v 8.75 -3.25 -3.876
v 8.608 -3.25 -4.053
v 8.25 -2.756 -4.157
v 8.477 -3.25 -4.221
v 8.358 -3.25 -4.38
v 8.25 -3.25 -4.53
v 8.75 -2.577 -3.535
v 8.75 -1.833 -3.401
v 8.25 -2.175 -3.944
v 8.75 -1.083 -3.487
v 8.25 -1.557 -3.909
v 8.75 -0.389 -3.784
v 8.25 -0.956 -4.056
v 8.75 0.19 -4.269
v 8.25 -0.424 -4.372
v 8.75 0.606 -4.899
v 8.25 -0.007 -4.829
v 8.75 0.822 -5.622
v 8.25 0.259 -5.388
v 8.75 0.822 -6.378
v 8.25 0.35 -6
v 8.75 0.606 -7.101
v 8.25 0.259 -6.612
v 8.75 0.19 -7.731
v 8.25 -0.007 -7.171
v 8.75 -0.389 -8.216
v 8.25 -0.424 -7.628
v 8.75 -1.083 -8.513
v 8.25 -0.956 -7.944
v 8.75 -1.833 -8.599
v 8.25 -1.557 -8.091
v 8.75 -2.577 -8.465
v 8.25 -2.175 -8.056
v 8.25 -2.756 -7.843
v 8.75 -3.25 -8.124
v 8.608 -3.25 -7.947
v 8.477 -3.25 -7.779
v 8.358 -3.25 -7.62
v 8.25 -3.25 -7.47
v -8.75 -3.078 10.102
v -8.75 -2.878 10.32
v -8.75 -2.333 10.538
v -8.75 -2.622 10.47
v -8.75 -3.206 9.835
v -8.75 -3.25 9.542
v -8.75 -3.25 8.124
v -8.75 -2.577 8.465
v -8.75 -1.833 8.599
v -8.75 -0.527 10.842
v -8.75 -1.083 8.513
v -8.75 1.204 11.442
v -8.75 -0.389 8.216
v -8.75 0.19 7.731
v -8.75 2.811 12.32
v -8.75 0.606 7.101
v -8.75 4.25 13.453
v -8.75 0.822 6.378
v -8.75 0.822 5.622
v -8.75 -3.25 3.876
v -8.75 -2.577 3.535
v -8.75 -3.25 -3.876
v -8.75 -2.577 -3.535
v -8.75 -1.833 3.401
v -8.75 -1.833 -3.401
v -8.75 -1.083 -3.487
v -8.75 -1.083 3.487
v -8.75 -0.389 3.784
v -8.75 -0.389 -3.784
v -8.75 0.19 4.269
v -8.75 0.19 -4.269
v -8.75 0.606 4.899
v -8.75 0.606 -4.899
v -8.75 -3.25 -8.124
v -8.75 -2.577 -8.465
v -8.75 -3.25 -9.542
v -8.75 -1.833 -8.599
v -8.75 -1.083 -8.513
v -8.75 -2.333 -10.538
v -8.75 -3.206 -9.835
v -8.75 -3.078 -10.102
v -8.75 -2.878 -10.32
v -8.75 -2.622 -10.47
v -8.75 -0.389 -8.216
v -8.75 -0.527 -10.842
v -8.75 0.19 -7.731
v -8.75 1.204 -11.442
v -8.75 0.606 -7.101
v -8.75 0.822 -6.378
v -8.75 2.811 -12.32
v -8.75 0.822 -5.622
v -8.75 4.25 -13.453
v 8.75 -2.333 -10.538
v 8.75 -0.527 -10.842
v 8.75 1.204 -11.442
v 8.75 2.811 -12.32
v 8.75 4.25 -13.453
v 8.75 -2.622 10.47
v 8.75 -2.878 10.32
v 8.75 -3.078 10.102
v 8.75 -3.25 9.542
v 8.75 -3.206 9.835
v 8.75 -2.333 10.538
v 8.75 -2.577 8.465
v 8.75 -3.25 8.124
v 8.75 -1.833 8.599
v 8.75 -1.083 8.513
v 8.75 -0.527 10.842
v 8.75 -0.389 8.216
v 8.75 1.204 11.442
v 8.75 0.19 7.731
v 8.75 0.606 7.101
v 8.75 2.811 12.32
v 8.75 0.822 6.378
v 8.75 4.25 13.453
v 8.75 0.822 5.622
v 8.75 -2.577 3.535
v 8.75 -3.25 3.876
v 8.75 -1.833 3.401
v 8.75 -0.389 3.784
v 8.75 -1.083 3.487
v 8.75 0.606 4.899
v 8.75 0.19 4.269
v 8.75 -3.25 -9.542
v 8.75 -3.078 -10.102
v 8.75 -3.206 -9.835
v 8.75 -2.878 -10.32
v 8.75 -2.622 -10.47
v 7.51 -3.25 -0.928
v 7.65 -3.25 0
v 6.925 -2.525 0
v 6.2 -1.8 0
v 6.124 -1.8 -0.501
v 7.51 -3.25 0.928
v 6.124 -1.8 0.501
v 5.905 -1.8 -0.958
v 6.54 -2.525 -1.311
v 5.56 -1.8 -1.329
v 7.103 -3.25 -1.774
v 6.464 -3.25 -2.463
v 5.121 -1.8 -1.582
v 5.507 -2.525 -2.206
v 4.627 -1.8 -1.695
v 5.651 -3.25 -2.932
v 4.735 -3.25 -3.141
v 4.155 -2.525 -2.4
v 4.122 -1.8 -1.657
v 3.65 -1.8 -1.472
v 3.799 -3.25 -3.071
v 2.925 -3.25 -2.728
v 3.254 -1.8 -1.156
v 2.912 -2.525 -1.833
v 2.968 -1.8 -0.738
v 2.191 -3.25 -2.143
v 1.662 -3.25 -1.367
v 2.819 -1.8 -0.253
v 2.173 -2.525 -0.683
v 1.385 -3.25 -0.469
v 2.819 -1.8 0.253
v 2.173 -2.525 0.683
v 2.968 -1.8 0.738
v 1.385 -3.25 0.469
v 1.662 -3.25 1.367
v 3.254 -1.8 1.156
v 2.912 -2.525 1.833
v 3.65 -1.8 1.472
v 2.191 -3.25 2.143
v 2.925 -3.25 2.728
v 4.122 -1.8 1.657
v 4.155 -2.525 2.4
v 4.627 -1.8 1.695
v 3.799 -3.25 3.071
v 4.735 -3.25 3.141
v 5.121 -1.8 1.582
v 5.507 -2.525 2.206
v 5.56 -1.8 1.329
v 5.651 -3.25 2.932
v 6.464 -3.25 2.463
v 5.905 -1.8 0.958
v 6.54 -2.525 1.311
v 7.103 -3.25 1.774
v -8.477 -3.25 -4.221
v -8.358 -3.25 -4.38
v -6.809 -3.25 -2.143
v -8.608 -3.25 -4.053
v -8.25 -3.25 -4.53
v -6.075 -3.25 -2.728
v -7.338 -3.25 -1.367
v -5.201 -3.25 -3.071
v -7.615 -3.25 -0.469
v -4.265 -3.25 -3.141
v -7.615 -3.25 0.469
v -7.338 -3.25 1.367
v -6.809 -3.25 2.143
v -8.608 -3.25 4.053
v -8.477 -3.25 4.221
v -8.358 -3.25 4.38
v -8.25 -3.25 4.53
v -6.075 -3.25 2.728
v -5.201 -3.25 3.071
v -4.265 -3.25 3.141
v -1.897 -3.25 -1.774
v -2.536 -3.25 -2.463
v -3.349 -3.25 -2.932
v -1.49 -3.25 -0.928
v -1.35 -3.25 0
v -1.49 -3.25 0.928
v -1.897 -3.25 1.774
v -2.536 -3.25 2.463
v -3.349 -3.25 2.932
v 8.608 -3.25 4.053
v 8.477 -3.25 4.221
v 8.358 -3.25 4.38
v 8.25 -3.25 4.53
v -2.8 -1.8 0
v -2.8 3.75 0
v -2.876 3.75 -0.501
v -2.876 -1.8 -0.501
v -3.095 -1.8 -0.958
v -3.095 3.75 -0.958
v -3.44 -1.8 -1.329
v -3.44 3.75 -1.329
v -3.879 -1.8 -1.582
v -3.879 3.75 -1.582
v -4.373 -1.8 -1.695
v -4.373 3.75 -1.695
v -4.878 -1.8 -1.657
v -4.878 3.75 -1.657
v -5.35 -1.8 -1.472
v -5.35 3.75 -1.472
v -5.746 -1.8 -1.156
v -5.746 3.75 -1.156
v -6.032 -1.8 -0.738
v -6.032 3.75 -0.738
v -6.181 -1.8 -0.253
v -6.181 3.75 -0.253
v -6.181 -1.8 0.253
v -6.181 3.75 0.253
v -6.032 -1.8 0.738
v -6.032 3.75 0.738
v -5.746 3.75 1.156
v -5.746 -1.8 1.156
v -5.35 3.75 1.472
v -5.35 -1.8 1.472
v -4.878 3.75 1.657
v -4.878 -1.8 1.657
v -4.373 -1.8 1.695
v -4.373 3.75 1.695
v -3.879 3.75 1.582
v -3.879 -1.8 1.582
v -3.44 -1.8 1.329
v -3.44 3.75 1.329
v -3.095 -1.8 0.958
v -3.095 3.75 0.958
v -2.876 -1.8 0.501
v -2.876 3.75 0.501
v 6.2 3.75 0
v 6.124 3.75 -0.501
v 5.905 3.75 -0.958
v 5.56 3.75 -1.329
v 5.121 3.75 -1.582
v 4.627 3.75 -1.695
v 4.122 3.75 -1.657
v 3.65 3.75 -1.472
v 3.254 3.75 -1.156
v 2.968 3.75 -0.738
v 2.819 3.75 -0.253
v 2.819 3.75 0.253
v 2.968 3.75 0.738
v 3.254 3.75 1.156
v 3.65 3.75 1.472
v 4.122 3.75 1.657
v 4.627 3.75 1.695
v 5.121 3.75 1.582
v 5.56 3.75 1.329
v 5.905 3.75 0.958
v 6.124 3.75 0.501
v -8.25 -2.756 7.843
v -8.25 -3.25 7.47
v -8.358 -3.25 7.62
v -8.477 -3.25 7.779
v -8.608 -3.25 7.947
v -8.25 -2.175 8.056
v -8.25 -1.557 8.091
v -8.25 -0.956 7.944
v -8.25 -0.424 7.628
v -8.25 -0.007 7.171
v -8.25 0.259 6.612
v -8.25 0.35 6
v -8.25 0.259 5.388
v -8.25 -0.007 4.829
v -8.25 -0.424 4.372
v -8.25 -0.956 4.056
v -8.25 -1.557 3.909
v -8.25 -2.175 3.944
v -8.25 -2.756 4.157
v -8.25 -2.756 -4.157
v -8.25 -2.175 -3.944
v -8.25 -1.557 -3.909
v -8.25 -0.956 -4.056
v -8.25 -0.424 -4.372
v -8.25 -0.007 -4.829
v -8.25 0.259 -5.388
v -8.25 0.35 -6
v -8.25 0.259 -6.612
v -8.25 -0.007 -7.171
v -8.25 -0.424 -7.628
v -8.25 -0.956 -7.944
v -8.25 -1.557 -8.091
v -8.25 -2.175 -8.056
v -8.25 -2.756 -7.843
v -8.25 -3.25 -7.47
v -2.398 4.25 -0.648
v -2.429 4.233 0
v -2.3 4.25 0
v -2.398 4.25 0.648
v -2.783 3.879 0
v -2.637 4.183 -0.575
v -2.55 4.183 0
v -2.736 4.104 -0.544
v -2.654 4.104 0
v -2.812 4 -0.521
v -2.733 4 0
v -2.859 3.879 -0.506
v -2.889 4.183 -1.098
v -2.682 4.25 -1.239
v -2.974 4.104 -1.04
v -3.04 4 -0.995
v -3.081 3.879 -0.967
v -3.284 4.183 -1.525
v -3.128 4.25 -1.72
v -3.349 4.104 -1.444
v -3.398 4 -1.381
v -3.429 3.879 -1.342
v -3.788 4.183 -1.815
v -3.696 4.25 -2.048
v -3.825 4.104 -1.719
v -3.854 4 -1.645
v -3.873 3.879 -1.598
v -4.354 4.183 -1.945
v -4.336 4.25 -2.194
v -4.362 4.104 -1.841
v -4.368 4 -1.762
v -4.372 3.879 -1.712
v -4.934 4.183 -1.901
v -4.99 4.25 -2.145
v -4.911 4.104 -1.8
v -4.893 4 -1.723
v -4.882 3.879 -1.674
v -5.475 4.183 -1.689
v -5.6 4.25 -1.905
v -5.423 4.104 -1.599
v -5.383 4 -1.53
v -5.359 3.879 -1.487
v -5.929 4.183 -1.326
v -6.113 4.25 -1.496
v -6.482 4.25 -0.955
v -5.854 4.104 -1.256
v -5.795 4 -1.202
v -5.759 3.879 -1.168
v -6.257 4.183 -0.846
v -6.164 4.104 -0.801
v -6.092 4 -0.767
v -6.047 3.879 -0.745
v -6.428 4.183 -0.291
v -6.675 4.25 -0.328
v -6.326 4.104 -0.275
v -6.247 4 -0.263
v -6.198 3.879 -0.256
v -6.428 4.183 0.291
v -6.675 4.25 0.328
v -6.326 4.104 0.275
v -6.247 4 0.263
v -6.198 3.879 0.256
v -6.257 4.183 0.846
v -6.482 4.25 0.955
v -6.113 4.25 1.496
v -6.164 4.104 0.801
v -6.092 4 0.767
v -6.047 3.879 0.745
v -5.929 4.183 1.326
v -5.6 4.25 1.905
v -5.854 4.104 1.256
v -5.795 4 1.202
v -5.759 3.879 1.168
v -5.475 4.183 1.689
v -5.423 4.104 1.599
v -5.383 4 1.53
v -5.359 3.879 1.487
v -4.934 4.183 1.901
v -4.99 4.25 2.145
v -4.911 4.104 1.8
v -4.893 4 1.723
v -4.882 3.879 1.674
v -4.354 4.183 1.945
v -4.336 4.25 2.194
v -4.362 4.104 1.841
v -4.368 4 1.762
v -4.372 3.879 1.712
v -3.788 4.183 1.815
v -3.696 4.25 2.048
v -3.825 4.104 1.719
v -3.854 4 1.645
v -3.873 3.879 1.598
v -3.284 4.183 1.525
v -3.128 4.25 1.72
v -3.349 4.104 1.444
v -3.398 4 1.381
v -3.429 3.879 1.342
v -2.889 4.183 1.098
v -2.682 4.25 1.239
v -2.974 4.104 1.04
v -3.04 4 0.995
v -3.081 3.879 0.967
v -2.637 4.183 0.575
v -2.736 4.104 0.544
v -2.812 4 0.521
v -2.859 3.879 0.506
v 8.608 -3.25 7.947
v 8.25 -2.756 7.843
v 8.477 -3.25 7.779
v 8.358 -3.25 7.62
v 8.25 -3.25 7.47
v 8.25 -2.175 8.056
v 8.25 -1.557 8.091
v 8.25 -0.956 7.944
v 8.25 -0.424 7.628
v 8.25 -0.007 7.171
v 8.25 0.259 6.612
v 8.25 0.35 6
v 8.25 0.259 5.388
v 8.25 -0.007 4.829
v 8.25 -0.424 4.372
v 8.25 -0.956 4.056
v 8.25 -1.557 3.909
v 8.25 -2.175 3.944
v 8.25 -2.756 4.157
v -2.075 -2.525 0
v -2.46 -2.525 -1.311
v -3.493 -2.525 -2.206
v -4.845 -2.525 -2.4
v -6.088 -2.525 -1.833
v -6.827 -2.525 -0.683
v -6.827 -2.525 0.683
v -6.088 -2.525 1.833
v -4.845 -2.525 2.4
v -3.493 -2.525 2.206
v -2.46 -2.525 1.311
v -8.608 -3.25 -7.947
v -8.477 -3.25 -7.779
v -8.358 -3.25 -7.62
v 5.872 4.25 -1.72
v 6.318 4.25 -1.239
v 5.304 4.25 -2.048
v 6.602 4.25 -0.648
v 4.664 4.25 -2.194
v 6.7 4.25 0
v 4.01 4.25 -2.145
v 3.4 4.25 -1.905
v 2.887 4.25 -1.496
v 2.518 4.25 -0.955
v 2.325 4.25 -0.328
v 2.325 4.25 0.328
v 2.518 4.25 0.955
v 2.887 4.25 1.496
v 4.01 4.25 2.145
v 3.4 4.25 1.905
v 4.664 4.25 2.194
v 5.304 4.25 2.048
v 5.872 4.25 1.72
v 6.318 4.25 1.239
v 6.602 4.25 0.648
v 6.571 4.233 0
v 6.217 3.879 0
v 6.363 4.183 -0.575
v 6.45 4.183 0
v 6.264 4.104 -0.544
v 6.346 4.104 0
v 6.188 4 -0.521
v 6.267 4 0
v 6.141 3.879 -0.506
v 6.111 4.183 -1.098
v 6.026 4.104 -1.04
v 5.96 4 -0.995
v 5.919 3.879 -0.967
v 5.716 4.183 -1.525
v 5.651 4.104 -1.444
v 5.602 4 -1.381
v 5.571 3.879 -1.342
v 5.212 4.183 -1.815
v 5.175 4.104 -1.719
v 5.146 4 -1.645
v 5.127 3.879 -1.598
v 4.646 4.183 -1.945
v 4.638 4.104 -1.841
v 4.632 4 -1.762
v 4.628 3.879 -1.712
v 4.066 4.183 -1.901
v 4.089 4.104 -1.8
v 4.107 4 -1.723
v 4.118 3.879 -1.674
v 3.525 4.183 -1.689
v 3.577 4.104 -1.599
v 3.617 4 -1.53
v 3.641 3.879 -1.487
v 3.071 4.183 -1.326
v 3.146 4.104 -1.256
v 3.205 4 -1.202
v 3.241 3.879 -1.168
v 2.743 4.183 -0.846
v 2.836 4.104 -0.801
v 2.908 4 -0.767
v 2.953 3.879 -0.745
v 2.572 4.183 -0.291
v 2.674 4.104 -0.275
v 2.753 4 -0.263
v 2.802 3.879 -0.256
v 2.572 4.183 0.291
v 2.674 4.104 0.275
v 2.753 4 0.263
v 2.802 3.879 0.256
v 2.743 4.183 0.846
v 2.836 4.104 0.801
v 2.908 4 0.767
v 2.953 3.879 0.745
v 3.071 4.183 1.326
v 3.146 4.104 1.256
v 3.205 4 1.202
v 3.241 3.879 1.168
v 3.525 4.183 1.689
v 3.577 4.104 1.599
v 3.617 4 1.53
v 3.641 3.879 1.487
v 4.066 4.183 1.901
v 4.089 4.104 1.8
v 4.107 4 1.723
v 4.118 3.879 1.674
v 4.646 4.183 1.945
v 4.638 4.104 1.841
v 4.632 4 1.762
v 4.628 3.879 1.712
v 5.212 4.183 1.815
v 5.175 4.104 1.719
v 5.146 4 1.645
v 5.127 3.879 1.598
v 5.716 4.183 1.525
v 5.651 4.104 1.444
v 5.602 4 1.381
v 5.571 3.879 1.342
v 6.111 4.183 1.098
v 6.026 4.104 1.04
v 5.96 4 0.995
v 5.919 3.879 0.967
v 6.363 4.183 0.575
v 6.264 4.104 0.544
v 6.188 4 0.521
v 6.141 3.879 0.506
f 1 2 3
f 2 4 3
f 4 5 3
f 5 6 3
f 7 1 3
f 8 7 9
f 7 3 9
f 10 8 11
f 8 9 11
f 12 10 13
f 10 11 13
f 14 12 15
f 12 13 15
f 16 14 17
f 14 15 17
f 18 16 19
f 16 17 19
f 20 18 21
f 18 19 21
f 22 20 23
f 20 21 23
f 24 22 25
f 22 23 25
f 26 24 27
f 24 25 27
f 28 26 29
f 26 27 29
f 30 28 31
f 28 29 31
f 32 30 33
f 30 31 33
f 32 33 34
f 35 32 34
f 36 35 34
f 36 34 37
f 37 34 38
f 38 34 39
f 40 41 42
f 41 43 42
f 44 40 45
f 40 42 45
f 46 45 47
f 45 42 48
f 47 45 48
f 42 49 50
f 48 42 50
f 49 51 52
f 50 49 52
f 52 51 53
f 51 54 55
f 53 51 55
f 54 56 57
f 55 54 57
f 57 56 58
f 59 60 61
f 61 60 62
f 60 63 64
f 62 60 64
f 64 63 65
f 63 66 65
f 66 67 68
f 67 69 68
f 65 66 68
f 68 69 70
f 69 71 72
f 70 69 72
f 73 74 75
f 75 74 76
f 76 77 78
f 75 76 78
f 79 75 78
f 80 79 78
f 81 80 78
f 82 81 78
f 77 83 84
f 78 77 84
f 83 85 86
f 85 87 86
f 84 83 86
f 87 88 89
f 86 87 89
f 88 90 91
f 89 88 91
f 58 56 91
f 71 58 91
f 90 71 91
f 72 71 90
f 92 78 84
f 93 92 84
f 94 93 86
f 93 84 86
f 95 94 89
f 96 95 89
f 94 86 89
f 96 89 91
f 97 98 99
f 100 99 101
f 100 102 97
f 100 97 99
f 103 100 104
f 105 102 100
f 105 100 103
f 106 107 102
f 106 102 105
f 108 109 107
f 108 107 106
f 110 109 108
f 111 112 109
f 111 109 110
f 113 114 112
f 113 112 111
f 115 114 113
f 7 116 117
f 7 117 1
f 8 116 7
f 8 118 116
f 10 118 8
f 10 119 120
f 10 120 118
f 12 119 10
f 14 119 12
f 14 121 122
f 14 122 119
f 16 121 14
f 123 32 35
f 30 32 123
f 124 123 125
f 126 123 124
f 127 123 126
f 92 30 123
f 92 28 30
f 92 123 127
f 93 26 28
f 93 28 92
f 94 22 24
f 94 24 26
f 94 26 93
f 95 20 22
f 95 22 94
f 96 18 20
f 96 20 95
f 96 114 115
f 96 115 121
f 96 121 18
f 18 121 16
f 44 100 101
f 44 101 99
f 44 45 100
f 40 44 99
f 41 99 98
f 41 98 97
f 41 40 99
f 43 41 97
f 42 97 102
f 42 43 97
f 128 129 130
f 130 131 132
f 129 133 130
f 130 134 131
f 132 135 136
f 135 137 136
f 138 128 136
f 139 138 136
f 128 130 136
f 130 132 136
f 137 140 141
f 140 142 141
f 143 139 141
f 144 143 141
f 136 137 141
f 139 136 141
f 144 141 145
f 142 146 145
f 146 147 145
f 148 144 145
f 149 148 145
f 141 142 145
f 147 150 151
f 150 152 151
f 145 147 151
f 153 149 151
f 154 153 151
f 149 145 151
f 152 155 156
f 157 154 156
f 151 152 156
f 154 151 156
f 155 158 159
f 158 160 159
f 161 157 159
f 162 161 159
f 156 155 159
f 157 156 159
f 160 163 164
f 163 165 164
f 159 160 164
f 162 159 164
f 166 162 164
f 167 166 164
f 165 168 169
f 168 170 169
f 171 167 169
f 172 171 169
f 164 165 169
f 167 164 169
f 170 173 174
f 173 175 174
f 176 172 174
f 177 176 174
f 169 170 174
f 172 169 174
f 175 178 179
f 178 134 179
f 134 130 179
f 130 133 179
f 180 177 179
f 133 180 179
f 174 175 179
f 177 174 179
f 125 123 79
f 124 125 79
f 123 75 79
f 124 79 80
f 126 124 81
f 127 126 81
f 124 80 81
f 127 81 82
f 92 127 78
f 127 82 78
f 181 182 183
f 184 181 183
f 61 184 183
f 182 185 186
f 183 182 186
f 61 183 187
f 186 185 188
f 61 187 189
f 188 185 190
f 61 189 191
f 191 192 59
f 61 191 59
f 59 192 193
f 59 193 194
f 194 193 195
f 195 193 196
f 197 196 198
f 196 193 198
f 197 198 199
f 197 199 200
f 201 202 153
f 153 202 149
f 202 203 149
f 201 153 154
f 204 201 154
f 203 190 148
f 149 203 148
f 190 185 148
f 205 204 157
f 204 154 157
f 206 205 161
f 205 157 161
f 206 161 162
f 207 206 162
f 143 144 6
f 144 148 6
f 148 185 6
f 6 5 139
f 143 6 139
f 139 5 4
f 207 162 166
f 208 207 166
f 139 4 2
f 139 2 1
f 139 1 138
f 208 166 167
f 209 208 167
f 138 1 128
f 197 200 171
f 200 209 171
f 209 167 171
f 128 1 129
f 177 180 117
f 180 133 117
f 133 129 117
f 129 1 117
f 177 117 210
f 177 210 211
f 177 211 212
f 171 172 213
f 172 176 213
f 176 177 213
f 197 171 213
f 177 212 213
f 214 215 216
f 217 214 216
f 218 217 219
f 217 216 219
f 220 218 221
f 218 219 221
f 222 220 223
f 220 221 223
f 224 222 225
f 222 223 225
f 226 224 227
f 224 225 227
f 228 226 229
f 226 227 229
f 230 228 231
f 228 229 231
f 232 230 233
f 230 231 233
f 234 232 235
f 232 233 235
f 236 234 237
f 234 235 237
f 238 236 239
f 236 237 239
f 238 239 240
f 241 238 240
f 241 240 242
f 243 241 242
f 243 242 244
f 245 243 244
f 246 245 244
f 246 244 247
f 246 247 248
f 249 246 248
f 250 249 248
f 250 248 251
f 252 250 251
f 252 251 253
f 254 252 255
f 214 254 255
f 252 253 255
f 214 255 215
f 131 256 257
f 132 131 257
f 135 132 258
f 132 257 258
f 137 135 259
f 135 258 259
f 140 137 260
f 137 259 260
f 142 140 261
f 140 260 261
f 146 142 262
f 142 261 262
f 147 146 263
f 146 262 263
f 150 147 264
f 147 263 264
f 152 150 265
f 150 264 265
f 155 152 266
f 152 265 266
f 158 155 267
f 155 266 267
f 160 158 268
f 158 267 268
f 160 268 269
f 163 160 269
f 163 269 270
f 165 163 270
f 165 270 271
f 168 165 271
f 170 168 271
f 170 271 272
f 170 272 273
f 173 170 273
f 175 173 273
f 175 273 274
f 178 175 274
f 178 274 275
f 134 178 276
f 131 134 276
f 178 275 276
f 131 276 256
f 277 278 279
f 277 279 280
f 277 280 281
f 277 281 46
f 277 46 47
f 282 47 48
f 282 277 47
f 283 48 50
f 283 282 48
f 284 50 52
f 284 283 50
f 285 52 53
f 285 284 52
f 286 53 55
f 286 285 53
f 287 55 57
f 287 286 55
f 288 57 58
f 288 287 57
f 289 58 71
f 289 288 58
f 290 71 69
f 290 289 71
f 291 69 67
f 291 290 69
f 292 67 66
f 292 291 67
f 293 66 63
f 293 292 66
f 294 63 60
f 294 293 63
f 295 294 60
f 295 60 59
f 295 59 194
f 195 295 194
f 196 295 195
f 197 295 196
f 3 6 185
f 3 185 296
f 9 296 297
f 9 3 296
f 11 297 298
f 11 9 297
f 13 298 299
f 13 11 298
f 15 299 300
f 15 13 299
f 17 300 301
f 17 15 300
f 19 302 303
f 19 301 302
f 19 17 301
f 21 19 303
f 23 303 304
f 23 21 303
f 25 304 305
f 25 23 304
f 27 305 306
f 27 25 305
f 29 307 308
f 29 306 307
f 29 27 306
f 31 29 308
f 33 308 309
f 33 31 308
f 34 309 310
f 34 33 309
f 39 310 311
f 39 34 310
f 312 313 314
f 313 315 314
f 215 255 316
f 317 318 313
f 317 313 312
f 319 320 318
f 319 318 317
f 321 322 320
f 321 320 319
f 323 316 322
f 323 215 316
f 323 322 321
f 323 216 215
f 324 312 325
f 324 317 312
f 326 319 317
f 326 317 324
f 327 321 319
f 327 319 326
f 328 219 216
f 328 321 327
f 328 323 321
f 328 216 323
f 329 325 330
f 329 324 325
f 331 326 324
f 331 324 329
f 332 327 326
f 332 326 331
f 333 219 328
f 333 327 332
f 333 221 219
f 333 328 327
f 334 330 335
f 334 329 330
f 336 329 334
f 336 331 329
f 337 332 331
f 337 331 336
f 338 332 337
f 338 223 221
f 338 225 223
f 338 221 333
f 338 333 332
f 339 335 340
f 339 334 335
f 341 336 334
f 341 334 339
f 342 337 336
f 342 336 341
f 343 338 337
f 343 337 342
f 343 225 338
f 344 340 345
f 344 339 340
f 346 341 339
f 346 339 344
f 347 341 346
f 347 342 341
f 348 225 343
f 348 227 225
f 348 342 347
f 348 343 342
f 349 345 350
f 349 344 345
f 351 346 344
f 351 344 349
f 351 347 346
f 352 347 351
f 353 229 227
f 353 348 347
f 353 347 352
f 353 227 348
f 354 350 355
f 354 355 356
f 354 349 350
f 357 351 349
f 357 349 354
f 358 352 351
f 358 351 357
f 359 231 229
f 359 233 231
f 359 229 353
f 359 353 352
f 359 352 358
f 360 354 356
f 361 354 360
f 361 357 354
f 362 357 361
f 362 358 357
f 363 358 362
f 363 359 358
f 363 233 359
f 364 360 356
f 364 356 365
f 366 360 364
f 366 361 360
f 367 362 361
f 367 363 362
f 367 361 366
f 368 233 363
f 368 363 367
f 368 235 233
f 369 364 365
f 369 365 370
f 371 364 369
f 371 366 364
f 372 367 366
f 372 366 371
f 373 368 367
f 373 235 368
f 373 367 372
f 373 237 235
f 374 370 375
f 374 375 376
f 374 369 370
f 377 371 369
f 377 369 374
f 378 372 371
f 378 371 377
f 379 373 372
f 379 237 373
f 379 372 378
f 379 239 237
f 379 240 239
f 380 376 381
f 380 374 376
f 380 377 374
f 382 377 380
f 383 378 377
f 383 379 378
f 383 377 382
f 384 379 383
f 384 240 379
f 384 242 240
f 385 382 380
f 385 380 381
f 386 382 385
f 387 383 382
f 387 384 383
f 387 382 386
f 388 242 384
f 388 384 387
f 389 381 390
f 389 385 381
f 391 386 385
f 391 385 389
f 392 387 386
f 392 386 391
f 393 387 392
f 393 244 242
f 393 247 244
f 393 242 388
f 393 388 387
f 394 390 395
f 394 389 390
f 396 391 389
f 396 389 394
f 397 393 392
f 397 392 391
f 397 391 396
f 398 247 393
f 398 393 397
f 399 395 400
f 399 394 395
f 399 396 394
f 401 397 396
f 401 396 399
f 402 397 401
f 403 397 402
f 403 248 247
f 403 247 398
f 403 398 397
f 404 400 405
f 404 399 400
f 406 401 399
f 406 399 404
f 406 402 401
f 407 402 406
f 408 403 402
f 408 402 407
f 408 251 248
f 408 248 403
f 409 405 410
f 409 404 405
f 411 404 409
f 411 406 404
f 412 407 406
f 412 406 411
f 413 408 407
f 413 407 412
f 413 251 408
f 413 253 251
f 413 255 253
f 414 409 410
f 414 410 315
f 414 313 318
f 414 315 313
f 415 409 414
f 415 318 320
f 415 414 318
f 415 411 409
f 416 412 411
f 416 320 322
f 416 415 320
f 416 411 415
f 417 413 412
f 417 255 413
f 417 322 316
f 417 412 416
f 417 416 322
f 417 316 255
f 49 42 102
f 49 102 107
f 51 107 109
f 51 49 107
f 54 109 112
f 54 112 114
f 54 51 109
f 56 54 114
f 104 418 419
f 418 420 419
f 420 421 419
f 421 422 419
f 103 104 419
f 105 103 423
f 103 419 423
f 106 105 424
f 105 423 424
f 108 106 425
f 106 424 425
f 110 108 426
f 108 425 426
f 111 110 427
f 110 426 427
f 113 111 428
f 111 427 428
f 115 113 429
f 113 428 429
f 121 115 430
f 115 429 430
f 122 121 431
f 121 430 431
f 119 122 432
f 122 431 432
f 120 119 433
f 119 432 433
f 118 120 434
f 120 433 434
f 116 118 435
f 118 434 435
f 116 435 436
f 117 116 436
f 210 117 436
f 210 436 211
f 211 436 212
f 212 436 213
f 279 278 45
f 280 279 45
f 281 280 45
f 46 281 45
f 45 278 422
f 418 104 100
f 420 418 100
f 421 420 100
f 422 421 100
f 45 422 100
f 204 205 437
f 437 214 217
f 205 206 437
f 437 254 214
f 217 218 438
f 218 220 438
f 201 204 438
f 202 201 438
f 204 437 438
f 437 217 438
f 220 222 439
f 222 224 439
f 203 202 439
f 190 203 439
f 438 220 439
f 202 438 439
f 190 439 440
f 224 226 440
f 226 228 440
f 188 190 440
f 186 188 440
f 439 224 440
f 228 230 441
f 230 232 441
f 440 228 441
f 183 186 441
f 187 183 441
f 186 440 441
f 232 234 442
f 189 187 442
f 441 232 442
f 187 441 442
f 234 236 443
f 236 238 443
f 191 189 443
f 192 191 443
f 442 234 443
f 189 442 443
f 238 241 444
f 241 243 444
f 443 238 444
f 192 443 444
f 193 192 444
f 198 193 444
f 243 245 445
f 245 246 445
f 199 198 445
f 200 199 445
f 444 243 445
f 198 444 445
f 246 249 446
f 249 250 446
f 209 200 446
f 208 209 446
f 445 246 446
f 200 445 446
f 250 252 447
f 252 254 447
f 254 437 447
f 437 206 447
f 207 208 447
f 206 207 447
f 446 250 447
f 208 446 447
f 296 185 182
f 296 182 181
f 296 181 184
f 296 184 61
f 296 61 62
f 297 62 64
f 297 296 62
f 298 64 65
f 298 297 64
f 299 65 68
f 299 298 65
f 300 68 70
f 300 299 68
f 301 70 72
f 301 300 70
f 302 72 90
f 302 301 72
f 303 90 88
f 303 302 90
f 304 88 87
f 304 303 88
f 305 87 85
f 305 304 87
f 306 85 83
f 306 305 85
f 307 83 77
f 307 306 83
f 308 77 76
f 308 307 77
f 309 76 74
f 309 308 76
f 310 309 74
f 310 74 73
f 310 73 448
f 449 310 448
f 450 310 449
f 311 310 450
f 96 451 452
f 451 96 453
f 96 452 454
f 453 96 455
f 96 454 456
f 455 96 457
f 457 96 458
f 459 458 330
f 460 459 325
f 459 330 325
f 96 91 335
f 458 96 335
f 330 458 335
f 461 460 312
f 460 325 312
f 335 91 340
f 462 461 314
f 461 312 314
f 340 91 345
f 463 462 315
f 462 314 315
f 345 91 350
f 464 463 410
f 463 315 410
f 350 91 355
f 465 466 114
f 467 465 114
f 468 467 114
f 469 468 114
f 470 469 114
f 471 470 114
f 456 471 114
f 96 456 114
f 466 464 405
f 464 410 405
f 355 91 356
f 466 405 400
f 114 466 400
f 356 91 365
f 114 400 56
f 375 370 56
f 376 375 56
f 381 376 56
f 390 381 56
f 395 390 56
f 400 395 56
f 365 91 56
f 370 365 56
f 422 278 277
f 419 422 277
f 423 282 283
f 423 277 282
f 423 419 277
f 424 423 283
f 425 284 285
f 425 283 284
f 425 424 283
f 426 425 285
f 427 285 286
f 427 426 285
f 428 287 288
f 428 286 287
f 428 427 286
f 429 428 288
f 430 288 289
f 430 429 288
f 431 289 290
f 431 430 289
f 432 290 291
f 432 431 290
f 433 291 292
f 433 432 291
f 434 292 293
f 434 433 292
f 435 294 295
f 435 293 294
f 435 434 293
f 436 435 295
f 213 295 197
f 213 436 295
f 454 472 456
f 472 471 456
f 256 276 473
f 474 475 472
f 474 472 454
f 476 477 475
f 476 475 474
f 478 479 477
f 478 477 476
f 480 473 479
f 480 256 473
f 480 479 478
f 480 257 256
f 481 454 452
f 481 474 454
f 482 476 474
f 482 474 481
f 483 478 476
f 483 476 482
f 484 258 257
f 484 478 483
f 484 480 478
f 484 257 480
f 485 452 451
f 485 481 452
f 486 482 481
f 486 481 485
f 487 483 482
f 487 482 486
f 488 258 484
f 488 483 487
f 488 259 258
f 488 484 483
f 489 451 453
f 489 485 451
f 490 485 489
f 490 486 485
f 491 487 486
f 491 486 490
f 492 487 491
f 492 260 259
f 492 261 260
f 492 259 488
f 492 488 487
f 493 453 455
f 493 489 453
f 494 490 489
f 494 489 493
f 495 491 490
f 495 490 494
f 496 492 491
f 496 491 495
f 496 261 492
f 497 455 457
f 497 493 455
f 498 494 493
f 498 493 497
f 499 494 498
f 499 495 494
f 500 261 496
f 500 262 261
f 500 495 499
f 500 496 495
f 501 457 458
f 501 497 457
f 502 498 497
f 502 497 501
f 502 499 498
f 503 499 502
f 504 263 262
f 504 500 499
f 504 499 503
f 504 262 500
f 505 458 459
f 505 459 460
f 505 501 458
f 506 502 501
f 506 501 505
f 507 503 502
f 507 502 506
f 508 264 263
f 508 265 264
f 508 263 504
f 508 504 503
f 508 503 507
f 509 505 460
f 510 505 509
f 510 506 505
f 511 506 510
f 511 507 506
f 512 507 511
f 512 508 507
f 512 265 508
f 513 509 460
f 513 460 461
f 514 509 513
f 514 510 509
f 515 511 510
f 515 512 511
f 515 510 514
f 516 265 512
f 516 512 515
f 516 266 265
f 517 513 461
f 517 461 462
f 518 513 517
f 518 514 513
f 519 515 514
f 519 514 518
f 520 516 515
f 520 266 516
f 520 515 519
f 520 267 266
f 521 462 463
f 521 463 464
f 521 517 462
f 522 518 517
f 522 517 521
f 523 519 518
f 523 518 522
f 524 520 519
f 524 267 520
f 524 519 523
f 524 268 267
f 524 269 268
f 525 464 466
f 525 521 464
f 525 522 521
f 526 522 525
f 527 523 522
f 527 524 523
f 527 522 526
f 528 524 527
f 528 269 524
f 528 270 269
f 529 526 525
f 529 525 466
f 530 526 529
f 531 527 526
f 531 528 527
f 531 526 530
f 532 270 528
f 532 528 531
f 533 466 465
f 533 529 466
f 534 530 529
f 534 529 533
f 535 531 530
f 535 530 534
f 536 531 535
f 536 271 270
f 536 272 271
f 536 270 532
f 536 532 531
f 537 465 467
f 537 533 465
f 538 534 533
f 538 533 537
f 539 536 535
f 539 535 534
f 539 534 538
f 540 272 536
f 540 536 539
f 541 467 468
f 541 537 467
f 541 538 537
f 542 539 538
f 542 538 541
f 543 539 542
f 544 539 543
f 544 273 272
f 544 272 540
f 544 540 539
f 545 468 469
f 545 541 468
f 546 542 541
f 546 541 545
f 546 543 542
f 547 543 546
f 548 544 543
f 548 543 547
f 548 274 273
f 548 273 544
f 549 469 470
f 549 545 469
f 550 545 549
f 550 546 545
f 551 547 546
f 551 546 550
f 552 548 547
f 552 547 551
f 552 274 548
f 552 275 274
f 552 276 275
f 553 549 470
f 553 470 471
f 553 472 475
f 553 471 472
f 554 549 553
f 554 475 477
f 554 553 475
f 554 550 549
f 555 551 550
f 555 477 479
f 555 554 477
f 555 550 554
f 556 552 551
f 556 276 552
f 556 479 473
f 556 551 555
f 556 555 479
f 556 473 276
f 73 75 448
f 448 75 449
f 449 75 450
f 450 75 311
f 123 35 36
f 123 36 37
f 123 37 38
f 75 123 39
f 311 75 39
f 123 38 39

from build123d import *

# Parameters (mm, degrees)
SKETCH1_W                                           = 17.5
SKETCH1_H                                           = 8.5
BOSS_EXTRUDE1_DEPTH                                 = 10.5
CUT_EXTRUDE1_DEPTH                                  = 21.846162716
CUT_EXTRUDE1_DEPTH_BACK                             = 21.846162716
SKETCH2_R                                           = 2.1
CHAMFER1_SIZE                                       = 0.5
CSK_FOR_M3_COUNTERSUNK_FLAT_HEAD_SCREW1_D           = 3.4
CSK_FOR_M3_COUNTERSUNK_FLAT_HEAD_SCREW1_DEPTH       = 19
CSK_FOR_M3_COUNTERSUNK_FLAT_HEAD_SCREW1_CSINK_D     = 6.3
CSK_FOR_M3_COUNTERSUNK_FLAT_HEAD_SCREW1_CSINK_ANGLE = 90
CSK_FOR_M3_COUNTERSUNK_FLAT_HEAD_SCREW1_TIP         = 1.021463052
FILLET1_R                                           = 0.5
CUT_EXTRUDE2_DEPTH                                  = 21.846162716
CUT_EXTRUDE2_DEPTH_BACK                             = 21.846162716
SKETCH6_W                                           = 21
SKETCH6_H                                           = 1
BOSS_EXTRUDE2_DEPTH                                 = 17.5
FILLET2_R                                           = 1


with BuildPart() as part:
    # Sketch1 → Boss-Extrude1 (new, symmetric)
    with BuildSketch(Plane.XY):
        Rectangle(SKETCH1_W, SKETCH1_H)
    extrude(amount=BOSS_EXTRUDE1_DEPTH, both=True)

    # Sketch2 → Cut-Extrude1 (cut, two sides: drawn at the far end of the back side and taken through both)
    with BuildSketch(Plane.ZY.offset(8.75).offset(-CUT_EXTRUDE1_DEPTH_BACK)):
        with Locations((6, -1.75)):
            Circle(SKETCH2_R)
        with Locations(Location((-6, -1.75, 0), (0, 0, 180))):
            Circle(SKETCH2_R)
        with BuildLine():
            Line((3.401923789, -3.25), (-3.401923789, -3.25))
            ThreePointArc((-3.401923789, -3.25), (-3.813859338, -3.804455891), (-4.341687605, -4.25))
            Line((-4.341687605, -4.25), (4.341687605, -4.25))
            ThreePointArc((4.341687605, -4.25), (3.813859338, -3.804455891), (3.401923789, -3.25))
        make_face()
    extrude(amount=CUT_EXTRUDE1_DEPTH + CUT_EXTRUDE1_DEPTH_BACK, mode=Mode.SUBTRACT)

    # Chamfer1
    # the kernel refuses this chamfer: 0.5 mm, written as the material it takes off along each edge
    with BuildSketch(Plane(origin=(8.75, -1.75, -6), x_dir=(0, 0, -1), z_dir=(0, 1, 0))) as chamfer1_piece_1:
        Polygon((2.1 + CHAMFER1_SIZE, 0), (2.1, CHAMFER1_SIZE), (2.1, 0), align=None)
    revolve(axis=Axis((8.75, -1.75, -6), (-1, 0, 0)), mode=Mode.SUBTRACT)
    with BuildSketch(Plane(origin=(-8.75, -1.75, -6), x_dir=(0, 0, -1), z_dir=(0, 1, 0))) as chamfer1_piece_2:
        Polygon((2.1 + CHAMFER1_SIZE, 0), (2.1, -CHAMFER1_SIZE), (2.1, 0), align=None)
    revolve(axis=Axis((-8.75, -1.75, -6), (-1, 0, 0)), mode=Mode.SUBTRACT)
    with BuildSketch(Plane(origin=(8.75, -1.75, 6), x_dir=(0, 0, 1), z_dir=(0, -1, 0))) as chamfer1_piece_3:
        Polygon((2.1 + CHAMFER1_SIZE, 0), (2.1, CHAMFER1_SIZE), (2.1, 0), align=None)
    revolve(axis=Axis((8.75, -1.75, 6), (-1, 0, 0)), mode=Mode.SUBTRACT)
    with BuildSketch(Plane(origin=(-8.75, -1.75, 6), x_dir=(0, 0, 1), z_dir=(0, -1, 0))) as chamfer1_piece_4:
        Polygon((2.1 + CHAMFER1_SIZE, 0), (2.1, -CHAMFER1_SIZE), (2.1, 0), align=None)
    revolve(axis=Axis((-8.75, -1.75, 6), (-1, 0, 0)), mode=Mode.SUBTRACT)

    # CSK for M3 Countersunk Flat Head Screw1
    with Locations(Plane(origin=(0, -3.25, 0), x_dir=(-1, 0, 0), z_dir=(0, -1, 0))):
        with Locations((4.5, 0), (-4.5, 0)):
            CounterSinkHole(CSK_FOR_M3_COUNTERSUNK_FLAT_HEAD_SCREW1_D / 2, CSK_FOR_M3_COUNTERSUNK_FLAT_HEAD_SCREW1_CSINK_D / 2, depth=CSK_FOR_M3_COUNTERSUNK_FLAT_HEAD_SCREW1_DEPTH, counter_sink_angle=CSK_FOR_M3_COUNTERSUNK_FLAT_HEAD_SCREW1_CSINK_ANGLE)
            with Locations((0, 0, -(CSK_FOR_M3_COUNTERSUNK_FLAT_HEAD_SCREW1_DEPTH + CSK_FOR_M3_COUNTERSUNK_FLAT_HEAD_SCREW1_TIP / 2))):  # 118° drill point
                Cone(0, CSK_FOR_M3_COUNTERSUNK_FLAT_HEAD_SCREW1_D / 2, CSK_FOR_M3_COUNTERSUNK_FLAT_HEAD_SCREW1_TIP, mode=Mode.SUBTRACT)

    # Fillet1
    fillet1_edges = [part.edges().sort_by_distance(p)[0] for p in [
        (2.8, 4.25, 0),
        (-6.2, 4.25, 0),
    ]]
    fillet(fillet1_edges, radius=FILLET1_R)

    # Sketch6 → Cut-Extrude2 (cut, two sides: drawn at the far end of the back side and taken through both)
    with BuildSketch(Plane.ZY.offset(8.75).offset(-CUT_EXTRUDE2_DEPTH_BACK)):
        with Locations((0, -3.75)):
            Rectangle(SKETCH6_W, SKETCH6_H)
    extrude(amount=CUT_EXTRUDE2_DEPTH + CUT_EXTRUDE2_DEPTH_BACK, mode=Mode.SUBTRACT)

    # Sketch8 → Boss-Extrude2 (add)
    with BuildSketch(Plane.ZY.offset(8.75)):
        with BuildLine():
            Line((-13.45326153, 4.25), (-10.5, 4.25))
            Line((-10.5, 4.25), (-10.5, -3.25))
            ThreePointArc((-10.5, -3.25), (-11.26491028, 0.780252897), (-13.45326153, 4.25))
        make_face()
        with BuildLine():
            Line((13.45326153, 4.25), (10.5, 4.25))
            Line((10.5, 4.25), (10.5, -3.25))
            ThreePointArc((10.5, -3.25), (11.26491028, 0.780252897), (13.45326153, 4.25))
        make_face()
    extrude(amount=-BOSS_EXTRUDE2_DEPTH)

    # Fillet2
    fillet2_edges = [part.edges().sort_by_distance(p)[0] for p in [
        (0, -3.25, 10.5),
        (0, -3.25, -10.5),
    ]]
    fillet(fillet2_edges, radius=FILLET2_R)


solid = part.part
